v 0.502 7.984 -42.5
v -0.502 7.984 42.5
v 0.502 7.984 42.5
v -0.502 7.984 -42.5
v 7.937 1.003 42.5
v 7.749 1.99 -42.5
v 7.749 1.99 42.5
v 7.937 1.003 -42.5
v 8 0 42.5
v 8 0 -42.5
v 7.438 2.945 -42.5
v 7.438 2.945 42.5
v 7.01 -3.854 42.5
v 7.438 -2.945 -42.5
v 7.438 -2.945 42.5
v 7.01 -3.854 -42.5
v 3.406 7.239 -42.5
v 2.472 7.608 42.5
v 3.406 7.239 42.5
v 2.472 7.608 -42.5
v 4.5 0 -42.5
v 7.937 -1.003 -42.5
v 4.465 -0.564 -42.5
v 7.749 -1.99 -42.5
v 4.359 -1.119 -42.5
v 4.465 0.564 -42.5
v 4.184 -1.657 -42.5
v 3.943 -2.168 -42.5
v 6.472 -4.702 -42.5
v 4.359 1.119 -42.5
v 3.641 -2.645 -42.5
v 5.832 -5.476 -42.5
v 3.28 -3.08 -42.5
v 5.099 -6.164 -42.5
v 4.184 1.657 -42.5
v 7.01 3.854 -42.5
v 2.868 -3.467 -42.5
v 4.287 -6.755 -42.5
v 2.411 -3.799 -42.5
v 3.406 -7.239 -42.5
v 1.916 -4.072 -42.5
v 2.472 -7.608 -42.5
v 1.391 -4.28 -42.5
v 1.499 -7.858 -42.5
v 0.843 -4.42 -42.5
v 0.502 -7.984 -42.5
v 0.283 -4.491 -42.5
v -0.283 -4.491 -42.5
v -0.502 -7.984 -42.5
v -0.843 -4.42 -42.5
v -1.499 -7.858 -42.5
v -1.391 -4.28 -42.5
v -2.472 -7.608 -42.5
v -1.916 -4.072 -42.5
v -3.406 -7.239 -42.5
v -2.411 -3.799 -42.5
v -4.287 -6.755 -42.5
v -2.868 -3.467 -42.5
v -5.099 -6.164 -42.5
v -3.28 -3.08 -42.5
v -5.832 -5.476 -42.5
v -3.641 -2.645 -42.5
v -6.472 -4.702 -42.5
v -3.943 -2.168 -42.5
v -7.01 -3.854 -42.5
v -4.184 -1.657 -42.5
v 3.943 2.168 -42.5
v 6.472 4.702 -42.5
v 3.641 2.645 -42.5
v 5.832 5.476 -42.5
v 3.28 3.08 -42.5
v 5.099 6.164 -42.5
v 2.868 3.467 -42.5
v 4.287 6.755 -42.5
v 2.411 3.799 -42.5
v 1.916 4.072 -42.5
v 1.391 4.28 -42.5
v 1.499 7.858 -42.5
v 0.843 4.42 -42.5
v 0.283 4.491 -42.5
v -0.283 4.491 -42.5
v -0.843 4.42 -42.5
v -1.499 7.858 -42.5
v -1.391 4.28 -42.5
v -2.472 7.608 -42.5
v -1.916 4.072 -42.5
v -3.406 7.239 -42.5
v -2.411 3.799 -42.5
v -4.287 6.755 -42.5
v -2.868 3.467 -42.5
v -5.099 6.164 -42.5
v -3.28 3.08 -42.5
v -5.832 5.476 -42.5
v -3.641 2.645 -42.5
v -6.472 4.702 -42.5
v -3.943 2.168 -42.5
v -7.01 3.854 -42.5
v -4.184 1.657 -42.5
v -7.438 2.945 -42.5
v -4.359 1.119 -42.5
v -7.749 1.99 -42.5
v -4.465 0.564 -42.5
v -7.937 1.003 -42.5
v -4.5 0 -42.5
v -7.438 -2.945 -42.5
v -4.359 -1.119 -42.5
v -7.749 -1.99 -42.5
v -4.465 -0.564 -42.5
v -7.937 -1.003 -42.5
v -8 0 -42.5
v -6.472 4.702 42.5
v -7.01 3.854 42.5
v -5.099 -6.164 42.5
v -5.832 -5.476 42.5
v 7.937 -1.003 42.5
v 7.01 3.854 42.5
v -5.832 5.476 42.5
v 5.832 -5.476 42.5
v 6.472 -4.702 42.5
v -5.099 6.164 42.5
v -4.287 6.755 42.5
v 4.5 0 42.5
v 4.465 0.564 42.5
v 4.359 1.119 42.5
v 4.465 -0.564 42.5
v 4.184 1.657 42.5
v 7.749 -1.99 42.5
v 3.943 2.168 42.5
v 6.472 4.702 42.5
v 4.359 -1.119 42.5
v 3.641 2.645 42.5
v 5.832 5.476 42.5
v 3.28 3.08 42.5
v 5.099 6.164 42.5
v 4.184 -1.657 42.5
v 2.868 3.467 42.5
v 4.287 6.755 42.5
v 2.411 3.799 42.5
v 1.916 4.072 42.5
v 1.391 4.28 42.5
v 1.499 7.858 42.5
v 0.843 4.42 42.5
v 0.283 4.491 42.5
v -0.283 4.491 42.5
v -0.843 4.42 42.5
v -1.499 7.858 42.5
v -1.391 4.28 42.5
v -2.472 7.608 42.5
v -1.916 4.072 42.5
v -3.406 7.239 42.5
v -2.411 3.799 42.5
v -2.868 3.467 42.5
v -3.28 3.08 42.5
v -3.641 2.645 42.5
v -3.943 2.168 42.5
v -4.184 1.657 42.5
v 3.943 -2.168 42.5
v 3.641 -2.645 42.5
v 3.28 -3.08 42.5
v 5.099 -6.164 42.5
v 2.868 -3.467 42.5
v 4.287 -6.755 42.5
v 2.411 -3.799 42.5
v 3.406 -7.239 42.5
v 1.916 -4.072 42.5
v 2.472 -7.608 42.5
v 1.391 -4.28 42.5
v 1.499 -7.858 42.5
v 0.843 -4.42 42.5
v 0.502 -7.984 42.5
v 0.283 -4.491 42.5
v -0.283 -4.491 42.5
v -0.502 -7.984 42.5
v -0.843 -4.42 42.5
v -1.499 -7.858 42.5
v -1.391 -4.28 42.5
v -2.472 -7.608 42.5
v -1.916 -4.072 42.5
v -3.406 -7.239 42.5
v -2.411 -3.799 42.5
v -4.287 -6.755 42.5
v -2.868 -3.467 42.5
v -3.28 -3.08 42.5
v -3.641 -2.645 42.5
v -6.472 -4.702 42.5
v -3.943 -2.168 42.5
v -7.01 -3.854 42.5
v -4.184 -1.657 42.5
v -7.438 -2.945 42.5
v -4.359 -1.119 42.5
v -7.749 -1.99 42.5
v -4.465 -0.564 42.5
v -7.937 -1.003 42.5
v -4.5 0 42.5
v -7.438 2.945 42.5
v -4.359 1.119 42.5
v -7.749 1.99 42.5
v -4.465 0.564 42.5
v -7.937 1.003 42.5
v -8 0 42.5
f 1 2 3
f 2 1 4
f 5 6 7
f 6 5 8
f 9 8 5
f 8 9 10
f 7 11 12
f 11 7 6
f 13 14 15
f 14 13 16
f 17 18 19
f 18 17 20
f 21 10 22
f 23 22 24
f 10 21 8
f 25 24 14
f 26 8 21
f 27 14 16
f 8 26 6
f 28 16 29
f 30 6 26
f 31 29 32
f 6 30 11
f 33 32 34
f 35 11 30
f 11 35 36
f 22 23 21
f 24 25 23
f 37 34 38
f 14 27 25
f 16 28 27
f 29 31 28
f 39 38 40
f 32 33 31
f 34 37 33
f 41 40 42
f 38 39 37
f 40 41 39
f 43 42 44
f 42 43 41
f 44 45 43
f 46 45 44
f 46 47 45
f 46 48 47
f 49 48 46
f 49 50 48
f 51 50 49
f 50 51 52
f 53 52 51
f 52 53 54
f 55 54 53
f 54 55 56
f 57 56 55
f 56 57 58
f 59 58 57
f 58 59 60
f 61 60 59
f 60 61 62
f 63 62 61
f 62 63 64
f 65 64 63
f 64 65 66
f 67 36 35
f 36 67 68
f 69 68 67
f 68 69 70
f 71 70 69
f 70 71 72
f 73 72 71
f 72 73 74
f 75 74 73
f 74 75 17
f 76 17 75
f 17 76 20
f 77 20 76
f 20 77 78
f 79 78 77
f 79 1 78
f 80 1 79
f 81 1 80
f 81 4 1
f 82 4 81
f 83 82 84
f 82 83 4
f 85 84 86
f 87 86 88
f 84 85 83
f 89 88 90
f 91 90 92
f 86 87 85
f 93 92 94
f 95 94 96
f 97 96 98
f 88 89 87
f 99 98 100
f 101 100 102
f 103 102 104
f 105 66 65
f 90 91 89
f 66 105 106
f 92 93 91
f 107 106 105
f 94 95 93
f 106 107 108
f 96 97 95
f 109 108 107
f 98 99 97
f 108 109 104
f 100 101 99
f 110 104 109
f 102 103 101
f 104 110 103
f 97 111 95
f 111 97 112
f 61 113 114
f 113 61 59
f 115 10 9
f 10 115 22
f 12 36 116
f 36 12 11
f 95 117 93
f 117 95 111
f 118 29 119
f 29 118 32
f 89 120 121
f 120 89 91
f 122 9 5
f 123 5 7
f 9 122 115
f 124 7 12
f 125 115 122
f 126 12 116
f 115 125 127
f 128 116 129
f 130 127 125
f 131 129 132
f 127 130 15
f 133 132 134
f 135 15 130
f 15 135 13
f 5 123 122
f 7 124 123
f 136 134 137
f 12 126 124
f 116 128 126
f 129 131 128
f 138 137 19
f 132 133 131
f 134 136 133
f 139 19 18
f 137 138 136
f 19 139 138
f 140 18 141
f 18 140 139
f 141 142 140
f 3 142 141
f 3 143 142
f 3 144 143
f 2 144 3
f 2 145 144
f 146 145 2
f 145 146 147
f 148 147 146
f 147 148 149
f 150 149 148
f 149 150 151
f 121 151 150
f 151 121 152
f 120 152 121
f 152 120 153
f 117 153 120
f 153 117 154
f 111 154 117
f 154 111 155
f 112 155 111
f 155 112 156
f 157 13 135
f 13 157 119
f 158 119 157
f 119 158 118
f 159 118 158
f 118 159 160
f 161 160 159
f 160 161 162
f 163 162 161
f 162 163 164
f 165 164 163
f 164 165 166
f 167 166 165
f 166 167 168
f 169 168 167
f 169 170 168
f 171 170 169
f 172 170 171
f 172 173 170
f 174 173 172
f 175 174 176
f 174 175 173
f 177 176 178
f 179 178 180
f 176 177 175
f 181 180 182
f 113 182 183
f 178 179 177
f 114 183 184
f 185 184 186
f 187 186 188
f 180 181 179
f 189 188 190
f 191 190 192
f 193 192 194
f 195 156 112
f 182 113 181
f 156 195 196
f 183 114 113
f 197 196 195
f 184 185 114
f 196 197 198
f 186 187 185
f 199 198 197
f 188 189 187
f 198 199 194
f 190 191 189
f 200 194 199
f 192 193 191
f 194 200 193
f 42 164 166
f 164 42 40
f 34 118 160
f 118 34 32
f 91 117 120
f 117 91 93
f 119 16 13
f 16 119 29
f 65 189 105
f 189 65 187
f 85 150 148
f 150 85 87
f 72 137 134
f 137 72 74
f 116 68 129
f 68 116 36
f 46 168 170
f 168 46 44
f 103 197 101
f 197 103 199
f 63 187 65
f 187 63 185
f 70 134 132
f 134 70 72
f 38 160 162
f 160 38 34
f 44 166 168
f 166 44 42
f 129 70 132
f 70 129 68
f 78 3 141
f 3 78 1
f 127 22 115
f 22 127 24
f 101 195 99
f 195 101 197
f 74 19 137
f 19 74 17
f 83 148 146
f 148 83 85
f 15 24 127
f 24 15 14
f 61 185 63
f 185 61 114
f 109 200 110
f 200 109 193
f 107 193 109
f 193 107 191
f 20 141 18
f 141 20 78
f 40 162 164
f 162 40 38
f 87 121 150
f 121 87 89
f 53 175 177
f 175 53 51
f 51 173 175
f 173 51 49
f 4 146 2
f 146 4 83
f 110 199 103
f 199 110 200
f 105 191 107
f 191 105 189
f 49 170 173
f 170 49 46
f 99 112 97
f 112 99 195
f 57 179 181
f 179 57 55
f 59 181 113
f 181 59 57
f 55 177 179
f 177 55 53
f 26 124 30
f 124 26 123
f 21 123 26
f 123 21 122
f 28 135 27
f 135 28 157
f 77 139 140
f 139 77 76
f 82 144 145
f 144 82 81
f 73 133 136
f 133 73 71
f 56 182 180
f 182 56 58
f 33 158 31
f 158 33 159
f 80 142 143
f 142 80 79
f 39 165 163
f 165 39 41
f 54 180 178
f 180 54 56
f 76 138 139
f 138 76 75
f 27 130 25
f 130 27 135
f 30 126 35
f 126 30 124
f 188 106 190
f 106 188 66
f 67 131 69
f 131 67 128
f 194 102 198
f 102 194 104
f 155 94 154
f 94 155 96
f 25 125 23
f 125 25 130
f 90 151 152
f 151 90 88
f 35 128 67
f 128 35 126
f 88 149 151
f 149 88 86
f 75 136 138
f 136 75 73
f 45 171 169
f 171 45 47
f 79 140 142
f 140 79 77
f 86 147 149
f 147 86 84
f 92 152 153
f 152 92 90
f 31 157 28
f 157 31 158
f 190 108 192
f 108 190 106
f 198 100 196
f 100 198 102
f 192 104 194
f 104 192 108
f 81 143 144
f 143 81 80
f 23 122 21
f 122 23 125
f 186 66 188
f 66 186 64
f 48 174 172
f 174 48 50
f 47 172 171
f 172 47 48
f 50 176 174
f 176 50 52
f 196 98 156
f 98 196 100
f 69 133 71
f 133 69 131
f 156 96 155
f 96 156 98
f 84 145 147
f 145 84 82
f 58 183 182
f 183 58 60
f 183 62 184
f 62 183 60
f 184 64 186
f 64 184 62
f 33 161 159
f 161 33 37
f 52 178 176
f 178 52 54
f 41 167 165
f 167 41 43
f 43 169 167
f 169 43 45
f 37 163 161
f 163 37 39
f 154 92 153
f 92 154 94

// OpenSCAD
$fn = 50;


difference() {
	union() {
		translate(v = [0, 0, -42.5000000000]) {
			cylinder(h = 85, r = 8.0000000000);
		}
	}
	union() {
		translate(v = [0, 0, -100.0000000000]) {
			cylinder(h = 200, r = 4.5000000000);
		}
	}
}
